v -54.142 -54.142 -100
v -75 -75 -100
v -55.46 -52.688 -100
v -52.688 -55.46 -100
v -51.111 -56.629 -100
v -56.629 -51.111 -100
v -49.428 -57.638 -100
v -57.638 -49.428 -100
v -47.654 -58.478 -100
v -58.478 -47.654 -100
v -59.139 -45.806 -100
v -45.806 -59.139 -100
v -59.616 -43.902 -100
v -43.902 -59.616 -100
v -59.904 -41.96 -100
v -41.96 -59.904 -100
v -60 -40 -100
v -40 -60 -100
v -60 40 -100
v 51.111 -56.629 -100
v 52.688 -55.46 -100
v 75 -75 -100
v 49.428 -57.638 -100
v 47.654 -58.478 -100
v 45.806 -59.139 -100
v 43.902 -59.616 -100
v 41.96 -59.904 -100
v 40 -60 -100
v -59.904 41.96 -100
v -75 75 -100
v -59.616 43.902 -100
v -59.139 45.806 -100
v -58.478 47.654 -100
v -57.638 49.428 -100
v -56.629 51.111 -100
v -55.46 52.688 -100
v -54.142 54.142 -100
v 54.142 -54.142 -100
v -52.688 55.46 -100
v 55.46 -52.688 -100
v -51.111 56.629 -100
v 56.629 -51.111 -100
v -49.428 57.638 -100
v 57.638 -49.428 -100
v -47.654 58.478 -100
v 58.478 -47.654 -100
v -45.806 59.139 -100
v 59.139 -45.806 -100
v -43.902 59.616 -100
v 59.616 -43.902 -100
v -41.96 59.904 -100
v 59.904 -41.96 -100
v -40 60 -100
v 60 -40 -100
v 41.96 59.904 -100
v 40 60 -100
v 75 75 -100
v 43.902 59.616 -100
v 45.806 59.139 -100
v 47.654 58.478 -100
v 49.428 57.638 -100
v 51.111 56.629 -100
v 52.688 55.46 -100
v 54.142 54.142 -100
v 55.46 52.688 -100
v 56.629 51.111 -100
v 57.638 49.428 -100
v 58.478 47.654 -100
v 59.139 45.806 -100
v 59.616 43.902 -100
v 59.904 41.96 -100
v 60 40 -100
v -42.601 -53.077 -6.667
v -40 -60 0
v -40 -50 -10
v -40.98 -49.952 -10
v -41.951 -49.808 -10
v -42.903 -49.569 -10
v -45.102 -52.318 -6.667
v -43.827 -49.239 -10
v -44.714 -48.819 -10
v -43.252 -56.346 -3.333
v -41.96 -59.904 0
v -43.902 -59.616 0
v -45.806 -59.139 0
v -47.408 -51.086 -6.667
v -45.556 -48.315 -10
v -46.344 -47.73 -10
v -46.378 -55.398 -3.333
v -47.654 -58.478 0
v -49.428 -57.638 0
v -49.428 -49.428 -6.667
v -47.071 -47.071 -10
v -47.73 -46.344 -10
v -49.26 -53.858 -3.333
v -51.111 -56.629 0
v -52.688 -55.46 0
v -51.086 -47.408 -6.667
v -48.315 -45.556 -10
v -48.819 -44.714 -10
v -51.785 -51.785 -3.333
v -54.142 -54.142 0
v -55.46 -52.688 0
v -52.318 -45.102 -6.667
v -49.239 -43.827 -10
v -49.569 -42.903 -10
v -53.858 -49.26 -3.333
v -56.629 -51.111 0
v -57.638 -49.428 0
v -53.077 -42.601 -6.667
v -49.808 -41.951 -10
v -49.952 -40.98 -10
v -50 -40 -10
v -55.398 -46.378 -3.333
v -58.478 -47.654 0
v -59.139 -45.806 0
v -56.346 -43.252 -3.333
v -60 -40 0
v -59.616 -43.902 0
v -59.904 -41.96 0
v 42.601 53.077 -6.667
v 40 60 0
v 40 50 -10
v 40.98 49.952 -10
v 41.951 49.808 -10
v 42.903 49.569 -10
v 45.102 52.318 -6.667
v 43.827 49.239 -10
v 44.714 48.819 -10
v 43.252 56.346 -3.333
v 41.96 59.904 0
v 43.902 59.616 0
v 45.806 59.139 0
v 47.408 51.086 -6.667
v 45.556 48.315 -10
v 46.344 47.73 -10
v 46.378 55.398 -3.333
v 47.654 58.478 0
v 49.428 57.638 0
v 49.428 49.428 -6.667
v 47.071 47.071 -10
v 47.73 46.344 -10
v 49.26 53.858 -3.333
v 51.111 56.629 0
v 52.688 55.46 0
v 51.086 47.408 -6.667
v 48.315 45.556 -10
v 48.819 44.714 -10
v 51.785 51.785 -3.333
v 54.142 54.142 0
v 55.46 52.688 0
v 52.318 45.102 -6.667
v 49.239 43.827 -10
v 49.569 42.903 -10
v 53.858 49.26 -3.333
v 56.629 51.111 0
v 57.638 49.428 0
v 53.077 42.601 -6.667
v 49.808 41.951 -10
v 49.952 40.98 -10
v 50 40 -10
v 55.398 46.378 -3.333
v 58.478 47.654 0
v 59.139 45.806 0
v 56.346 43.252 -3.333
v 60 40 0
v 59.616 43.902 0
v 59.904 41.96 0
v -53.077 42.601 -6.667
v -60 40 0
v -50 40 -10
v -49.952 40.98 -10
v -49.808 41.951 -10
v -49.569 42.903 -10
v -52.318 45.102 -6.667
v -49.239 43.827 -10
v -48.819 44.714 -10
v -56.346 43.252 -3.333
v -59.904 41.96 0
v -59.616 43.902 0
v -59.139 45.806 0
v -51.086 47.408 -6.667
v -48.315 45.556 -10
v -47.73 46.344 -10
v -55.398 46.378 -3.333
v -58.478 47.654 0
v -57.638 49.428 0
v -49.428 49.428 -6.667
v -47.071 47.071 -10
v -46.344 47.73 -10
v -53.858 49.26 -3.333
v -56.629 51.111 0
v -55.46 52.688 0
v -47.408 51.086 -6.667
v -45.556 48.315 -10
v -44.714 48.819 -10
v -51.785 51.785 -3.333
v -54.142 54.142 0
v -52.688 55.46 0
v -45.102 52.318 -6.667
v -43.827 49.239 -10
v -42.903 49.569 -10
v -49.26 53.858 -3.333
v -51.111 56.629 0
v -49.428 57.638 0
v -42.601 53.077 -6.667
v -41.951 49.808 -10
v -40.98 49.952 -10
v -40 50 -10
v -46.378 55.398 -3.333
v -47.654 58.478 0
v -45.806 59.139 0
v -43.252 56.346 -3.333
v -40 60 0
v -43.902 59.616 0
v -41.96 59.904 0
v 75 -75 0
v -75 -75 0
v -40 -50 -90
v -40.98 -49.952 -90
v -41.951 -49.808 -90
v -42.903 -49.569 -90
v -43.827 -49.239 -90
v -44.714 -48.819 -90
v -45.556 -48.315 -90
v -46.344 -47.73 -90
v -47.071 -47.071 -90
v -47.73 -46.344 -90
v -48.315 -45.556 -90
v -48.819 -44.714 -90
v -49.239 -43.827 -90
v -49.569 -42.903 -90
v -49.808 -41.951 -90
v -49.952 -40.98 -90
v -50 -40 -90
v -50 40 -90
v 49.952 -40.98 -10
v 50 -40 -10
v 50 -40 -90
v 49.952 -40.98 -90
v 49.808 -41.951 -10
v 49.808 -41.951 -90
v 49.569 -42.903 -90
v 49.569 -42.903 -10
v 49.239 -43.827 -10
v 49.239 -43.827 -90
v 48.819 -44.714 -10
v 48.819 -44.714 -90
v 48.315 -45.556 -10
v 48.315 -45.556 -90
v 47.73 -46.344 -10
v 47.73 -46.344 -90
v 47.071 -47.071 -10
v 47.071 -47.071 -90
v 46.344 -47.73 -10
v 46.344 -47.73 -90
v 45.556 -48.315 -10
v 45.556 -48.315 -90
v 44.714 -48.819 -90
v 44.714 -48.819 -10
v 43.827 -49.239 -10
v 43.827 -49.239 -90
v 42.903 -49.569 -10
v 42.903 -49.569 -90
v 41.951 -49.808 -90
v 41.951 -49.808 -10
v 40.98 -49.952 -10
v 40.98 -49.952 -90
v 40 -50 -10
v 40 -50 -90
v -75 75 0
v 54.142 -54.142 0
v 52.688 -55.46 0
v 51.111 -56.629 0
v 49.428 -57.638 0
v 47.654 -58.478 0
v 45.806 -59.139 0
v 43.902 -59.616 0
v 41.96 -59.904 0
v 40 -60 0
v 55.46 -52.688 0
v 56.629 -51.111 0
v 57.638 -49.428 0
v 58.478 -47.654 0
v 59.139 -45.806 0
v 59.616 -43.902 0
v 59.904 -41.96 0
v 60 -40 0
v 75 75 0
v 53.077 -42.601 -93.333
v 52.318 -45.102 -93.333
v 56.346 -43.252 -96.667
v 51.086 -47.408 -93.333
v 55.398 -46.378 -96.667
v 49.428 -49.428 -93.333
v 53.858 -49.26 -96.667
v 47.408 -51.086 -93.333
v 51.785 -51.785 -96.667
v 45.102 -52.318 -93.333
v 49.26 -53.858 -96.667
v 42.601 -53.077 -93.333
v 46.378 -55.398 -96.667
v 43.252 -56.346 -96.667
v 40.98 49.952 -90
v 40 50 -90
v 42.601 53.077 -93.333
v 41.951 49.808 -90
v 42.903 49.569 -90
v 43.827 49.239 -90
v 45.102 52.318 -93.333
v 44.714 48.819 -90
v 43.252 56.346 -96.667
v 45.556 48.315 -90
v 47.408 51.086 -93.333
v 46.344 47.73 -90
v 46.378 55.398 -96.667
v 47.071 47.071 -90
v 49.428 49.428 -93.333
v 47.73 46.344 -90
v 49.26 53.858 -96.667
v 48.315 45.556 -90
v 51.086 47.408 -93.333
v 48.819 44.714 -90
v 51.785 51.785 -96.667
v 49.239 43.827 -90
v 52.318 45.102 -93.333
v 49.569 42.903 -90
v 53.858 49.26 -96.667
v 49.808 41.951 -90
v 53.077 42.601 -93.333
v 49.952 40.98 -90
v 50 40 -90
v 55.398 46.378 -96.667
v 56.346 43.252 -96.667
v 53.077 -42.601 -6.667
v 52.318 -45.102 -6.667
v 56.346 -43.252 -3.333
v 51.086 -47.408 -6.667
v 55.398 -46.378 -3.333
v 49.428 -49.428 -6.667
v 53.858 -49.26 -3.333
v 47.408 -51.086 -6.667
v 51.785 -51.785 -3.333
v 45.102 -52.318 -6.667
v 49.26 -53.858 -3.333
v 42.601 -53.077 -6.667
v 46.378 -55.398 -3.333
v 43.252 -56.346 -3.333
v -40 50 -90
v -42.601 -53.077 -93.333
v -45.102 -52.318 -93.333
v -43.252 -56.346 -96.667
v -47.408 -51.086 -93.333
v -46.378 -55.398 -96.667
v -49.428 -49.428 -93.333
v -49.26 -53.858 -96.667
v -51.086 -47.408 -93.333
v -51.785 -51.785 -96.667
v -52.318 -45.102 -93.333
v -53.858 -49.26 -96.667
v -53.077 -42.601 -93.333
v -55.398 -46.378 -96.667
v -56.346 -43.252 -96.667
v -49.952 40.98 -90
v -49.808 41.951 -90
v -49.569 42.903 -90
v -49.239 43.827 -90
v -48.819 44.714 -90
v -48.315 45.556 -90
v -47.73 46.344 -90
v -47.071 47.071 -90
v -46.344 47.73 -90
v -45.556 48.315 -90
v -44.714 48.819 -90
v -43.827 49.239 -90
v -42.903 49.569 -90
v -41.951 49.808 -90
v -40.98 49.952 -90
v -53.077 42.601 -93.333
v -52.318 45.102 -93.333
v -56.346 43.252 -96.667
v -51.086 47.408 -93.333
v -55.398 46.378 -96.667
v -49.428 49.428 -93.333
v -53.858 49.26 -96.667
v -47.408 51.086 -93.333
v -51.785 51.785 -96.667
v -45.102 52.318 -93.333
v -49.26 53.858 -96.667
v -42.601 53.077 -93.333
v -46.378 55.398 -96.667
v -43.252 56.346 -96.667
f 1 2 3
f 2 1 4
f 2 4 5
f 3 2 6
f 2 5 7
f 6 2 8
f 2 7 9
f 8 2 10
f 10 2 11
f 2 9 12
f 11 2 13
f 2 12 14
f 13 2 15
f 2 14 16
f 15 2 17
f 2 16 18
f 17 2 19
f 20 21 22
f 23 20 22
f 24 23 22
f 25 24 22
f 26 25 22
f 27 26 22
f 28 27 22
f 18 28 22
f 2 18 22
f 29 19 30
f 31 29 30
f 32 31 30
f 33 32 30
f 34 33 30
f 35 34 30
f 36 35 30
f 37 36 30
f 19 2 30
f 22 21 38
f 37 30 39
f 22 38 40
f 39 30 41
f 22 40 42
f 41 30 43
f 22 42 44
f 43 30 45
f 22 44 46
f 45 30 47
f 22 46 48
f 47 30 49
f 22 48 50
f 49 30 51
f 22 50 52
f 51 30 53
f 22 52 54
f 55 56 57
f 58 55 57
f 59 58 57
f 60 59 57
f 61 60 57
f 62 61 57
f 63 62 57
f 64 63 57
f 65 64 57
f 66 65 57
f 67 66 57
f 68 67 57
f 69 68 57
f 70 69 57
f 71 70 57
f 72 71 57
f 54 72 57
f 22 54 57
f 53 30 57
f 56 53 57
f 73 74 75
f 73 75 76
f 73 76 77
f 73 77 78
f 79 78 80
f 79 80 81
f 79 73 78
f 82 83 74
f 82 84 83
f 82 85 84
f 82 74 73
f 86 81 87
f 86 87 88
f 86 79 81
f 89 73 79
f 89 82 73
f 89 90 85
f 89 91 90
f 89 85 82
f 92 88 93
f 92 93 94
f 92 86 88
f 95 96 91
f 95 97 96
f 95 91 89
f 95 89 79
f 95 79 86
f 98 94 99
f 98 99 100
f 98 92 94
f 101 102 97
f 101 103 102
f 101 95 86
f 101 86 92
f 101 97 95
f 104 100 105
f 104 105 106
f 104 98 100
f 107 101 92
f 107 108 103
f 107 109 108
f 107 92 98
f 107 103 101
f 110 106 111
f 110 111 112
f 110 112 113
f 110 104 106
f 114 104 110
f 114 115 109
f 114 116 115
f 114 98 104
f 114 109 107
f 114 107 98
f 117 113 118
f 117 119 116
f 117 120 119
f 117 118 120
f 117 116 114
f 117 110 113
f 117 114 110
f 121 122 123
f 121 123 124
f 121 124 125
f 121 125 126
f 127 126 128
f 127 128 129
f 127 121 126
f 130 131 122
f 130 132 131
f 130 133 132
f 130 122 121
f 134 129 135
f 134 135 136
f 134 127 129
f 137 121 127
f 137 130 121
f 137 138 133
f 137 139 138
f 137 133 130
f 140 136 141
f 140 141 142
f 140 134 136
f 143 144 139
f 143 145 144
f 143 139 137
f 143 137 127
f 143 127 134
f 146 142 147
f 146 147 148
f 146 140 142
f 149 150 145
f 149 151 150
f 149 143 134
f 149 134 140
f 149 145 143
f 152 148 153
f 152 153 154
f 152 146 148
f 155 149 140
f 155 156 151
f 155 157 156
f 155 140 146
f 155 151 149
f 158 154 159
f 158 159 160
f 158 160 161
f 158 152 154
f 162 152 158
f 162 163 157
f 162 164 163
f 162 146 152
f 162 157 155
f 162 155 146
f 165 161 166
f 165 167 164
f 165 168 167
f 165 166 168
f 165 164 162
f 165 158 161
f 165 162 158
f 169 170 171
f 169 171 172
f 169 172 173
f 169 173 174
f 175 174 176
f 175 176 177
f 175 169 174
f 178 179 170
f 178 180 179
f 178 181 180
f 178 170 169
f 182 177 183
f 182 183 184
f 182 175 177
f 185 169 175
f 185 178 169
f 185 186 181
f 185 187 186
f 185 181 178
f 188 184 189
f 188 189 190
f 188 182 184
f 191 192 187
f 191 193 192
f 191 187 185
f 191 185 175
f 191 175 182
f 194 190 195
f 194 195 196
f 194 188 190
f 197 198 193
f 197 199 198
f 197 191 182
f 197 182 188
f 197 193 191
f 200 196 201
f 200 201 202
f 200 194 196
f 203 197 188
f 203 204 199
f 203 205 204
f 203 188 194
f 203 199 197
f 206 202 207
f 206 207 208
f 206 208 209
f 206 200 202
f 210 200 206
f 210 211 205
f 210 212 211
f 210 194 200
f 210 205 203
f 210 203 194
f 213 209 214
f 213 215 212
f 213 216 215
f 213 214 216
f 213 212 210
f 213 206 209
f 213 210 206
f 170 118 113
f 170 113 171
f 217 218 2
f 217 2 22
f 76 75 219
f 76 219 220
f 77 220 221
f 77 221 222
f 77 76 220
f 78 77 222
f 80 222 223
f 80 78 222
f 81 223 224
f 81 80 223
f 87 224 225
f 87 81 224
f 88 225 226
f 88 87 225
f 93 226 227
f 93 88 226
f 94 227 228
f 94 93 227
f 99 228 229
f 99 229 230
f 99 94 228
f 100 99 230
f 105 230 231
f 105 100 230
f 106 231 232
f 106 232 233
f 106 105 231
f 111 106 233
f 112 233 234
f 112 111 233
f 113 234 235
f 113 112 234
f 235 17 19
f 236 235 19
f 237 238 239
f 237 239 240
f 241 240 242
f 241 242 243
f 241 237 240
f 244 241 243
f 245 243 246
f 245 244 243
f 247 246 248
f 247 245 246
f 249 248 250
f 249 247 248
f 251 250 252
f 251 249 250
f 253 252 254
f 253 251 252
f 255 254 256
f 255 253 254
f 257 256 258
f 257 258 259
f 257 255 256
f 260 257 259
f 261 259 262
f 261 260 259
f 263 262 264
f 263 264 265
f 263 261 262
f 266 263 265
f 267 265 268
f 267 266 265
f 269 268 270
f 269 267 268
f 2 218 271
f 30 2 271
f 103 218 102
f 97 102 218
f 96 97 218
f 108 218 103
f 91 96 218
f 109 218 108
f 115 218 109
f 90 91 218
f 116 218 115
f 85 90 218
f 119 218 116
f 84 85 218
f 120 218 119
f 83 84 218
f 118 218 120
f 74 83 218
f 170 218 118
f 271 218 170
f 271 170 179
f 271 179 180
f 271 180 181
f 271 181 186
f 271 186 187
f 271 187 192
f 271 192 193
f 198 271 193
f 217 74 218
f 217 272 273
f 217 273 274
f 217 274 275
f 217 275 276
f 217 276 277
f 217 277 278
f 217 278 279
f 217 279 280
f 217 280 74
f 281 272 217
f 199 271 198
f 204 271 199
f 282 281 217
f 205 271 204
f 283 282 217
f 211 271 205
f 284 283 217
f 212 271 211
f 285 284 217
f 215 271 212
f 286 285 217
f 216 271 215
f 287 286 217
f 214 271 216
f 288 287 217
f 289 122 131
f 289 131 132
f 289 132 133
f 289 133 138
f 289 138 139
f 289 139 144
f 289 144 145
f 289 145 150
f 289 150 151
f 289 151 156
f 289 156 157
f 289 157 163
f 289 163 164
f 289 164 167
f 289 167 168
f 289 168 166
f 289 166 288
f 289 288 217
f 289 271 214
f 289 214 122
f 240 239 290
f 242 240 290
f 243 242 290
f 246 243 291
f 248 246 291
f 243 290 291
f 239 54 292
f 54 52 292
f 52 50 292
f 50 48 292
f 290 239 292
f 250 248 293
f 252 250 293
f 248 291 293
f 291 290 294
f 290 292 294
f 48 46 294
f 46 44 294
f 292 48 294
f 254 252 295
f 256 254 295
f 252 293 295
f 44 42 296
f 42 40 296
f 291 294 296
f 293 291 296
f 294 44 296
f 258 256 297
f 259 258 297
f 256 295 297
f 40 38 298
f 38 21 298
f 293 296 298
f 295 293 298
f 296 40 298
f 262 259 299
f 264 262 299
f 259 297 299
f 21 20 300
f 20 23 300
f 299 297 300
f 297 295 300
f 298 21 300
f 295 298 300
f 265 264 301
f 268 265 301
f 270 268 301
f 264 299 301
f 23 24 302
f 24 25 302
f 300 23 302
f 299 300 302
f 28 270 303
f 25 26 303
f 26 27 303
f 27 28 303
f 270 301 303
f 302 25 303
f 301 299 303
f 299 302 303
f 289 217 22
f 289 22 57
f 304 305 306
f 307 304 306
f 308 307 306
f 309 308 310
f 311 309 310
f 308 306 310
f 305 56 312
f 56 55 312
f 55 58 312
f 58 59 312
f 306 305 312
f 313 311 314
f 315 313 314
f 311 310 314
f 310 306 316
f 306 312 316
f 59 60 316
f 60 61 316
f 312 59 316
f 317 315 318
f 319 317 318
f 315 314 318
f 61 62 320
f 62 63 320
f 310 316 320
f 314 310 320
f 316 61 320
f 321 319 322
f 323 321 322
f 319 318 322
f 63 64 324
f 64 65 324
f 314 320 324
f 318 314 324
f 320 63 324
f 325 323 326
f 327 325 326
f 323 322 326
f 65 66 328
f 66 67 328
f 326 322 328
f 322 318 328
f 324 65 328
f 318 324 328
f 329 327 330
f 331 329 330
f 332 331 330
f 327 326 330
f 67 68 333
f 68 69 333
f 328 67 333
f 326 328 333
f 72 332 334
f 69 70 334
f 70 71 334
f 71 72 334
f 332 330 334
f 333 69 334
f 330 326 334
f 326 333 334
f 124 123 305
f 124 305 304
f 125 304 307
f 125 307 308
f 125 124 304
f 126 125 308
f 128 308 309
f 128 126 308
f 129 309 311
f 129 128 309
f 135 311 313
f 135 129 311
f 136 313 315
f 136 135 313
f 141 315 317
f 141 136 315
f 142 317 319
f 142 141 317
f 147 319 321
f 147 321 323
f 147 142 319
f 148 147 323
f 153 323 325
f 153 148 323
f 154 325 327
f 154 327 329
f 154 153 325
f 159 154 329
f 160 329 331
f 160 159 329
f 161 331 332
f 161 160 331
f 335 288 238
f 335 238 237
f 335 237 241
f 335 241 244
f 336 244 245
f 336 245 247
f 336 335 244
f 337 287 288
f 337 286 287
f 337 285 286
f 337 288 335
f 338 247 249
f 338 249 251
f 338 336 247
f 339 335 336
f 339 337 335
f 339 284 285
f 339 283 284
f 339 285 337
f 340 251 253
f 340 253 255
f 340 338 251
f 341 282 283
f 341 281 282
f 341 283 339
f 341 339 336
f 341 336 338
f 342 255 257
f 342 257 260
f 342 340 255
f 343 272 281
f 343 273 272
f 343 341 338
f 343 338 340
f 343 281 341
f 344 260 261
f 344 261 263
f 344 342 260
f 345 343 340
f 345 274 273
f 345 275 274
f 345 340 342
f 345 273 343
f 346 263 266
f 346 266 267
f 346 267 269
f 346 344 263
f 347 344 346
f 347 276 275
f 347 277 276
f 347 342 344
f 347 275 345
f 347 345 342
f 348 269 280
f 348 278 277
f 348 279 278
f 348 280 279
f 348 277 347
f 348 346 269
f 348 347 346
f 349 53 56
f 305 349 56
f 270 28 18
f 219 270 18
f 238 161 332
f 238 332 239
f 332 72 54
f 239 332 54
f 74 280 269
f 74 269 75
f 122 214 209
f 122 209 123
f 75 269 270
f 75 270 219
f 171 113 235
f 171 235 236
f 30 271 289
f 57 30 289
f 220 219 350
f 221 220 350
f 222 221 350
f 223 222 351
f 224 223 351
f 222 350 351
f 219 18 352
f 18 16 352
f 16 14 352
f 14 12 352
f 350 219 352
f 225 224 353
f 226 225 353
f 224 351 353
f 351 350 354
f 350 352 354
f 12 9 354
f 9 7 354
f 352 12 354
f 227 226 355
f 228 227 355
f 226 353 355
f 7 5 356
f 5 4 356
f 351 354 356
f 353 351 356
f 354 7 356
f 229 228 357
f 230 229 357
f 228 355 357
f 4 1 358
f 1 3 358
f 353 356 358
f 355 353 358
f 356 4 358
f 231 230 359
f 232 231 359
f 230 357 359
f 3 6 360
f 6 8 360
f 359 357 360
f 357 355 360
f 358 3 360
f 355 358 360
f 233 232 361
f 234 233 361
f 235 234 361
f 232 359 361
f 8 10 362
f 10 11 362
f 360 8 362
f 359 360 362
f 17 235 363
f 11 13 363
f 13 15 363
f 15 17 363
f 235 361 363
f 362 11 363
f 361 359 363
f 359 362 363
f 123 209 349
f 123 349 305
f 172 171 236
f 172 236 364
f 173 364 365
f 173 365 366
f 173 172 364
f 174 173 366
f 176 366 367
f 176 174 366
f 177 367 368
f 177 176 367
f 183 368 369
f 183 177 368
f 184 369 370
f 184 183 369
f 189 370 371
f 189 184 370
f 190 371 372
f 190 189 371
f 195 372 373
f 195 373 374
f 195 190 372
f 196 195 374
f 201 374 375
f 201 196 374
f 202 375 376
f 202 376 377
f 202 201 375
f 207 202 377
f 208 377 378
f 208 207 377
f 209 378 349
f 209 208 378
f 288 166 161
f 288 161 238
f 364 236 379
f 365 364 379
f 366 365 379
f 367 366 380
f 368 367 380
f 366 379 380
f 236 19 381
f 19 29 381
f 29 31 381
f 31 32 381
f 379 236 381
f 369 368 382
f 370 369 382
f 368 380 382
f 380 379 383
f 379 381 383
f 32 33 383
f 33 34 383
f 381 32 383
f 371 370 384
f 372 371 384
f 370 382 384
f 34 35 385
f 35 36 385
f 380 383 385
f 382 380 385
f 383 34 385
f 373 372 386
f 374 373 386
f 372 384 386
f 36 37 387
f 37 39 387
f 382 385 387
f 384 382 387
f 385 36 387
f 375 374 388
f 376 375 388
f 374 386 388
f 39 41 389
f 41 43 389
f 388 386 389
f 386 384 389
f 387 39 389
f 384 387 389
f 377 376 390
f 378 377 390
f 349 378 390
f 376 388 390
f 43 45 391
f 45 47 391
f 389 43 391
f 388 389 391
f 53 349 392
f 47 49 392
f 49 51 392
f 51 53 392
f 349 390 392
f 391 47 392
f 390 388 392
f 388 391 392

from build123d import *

# Parameters (mm, degrees)
F0_W     = 150
F0_H     = 150
F1_DEPTH = 100
F2_SIZE  = 10
F3_SIZE  = 10


with BuildPart() as f1:
    # F0 (on Top) → F1 (new body)
    with BuildSketch(Plane.XY):
        Rectangle(F0_W, F0_H)
        with BuildLine():
            ThreePointArc((50, -40), (47.071068, -47.071068), (40, -50))
            Line((40, -50), (-40, -50))
            ThreePointArc((-40, -50), (-47.071068, -47.071068), (-50, -40))
            Line((-50, -40), (-50, 40))
            ThreePointArc((-50, 40), (-47.071068, 47.071068), (-40, 50))
            Line((-40, 50), (40, 50))
            ThreePointArc((40, 50), (47.071068, 47.071068), (50, 40))
            Line((50, 40), (50, -40))
        make_face(mode=Mode.SUBTRACT)
    extrude(amount=-F1_DEPTH)

    # F2
    f2_edges = [f1.edges().sort_by_distance(p)[0] for p in [
        (-50, 0, 0),
    ]]
    chamfer(f2_edges, length=F2_SIZE)

    # F3
    f3_edges = [f1.edges().sort_by_distance(p)[0] for p in [
        (50, 0, -100),
    ]]
    chamfer(f3_edges, length=F3_SIZE)


solid = f1.part
